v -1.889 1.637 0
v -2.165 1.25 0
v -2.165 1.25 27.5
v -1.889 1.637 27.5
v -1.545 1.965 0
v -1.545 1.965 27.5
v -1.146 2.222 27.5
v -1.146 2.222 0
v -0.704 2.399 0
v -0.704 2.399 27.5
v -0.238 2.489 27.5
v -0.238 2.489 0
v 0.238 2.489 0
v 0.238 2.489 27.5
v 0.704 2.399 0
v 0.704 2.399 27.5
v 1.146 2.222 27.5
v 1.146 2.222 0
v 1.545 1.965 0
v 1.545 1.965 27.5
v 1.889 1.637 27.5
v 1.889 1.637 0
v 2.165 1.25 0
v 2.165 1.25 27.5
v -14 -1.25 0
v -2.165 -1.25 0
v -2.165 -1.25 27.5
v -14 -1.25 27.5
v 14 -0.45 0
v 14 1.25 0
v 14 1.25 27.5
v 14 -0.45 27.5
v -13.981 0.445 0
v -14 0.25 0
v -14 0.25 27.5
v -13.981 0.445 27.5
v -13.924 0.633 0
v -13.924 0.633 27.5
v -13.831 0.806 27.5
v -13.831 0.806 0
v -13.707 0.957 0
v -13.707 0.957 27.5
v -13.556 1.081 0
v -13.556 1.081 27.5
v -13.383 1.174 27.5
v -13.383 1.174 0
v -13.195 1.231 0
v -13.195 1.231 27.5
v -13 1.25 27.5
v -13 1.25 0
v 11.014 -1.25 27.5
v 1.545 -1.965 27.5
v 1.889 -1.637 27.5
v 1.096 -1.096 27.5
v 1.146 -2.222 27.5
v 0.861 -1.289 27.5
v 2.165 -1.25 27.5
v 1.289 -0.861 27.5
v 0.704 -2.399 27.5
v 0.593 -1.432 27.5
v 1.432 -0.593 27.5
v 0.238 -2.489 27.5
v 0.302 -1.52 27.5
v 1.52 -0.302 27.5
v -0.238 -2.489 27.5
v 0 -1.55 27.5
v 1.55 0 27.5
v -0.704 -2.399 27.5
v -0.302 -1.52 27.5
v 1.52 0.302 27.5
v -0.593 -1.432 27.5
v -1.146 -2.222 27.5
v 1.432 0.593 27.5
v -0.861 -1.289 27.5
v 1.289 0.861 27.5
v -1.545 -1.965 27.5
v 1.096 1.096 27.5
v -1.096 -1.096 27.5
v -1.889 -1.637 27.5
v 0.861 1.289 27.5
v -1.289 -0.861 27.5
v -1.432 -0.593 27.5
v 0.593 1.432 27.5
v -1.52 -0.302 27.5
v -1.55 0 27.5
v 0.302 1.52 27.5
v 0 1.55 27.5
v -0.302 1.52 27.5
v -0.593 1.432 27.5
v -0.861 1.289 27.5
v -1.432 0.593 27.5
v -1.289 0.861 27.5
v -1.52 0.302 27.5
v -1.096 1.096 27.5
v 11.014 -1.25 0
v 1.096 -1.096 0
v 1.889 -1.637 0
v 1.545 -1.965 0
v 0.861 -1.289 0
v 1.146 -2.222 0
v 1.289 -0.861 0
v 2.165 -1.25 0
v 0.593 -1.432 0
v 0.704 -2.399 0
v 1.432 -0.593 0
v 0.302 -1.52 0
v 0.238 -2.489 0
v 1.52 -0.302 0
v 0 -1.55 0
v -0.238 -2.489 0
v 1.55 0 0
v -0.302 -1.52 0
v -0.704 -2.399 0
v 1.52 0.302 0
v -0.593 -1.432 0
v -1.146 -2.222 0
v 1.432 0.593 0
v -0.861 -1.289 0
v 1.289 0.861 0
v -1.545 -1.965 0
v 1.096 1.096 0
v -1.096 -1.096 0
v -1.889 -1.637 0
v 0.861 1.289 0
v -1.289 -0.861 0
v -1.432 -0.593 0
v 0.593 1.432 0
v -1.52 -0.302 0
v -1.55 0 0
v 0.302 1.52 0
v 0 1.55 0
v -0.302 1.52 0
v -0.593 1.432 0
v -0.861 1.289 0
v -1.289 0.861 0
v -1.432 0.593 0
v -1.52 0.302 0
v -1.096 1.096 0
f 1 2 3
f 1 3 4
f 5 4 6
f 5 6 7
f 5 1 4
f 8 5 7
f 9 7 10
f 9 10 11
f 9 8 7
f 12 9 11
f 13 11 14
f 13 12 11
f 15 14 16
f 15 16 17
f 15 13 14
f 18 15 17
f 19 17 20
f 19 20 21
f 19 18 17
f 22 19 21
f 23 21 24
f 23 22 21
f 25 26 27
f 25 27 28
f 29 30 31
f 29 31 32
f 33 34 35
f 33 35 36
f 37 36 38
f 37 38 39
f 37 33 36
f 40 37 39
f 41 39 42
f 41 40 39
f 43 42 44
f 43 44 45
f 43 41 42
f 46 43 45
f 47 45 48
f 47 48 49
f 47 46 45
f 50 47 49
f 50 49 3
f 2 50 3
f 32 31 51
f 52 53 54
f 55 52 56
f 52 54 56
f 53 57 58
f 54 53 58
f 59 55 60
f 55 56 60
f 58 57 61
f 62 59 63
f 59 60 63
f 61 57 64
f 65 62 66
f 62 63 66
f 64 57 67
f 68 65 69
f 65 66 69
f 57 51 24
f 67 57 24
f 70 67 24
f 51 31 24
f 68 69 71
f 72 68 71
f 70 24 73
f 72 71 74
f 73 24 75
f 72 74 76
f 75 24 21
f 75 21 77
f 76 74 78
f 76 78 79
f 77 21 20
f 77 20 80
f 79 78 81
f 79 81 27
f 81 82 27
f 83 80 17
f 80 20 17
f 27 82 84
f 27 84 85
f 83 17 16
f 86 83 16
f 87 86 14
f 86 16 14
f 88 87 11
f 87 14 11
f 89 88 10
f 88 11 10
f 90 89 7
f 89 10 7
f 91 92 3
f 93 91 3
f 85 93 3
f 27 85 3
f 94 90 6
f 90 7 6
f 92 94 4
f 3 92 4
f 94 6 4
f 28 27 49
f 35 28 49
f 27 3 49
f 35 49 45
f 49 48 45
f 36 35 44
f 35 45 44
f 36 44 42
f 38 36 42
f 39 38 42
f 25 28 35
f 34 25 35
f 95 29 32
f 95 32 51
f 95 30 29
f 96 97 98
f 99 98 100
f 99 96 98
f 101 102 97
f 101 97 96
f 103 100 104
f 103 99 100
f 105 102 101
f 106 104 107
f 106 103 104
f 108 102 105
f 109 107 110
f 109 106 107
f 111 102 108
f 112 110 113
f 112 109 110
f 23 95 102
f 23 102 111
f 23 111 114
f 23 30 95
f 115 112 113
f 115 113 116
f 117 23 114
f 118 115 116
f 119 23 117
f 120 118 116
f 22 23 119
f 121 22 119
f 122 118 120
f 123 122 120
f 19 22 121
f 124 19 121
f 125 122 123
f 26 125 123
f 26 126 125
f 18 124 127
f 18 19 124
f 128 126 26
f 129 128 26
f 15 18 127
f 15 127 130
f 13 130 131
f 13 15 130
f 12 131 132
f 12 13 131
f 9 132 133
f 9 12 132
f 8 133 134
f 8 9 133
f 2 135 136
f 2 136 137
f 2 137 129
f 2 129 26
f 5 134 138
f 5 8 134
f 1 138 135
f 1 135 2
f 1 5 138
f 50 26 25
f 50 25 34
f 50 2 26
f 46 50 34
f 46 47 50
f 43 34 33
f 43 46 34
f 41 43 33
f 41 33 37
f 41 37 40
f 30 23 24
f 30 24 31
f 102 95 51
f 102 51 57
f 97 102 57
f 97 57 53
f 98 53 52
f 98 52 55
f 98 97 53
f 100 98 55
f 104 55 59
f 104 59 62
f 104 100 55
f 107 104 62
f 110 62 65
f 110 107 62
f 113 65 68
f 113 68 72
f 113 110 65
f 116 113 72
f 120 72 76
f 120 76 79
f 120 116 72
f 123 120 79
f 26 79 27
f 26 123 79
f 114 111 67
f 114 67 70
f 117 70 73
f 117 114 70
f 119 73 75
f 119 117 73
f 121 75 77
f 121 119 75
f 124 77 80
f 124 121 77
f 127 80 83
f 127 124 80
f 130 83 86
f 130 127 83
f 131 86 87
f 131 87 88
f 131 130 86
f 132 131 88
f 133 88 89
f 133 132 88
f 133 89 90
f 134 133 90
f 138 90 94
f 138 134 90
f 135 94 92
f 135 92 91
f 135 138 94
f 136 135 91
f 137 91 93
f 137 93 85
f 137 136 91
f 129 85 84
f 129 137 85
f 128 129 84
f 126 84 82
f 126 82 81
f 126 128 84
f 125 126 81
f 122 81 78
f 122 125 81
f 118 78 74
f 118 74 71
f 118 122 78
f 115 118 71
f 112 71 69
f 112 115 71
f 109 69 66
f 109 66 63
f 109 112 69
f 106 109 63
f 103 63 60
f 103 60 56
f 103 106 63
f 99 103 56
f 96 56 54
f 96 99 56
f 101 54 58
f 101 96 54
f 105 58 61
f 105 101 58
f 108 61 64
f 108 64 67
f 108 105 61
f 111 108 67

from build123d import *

# Parameters (mm, degrees)
SKETCH_1_R      = 1.55
EXTRUDE_1_DEPTH = 27.5


with BuildPart() as part:
    # 草图1 → 凸台-拉伸1 (new body)
    with BuildSketch(Plane.XY):
        with BuildLine():
            Line((2.165063509, 1.25), (14, 1.25))
            Line((14, 1.25), (14, -0.45))
            Line((14, -0.45), (11.014359354, -1.25))
            Line((11.014359354, -1.25), (2.165063509, -1.25))
            ThreePointArc((2.165063509, -1.25), (0, -2.5), (-2.165063509, -1.25))
            Line((-2.165063509, -1.25), (-14, -1.25))
            Line((-14, -1.25), (-14, 0.25))
            ThreePointArc((-14, 0.25), (-13.707106781, 0.957106781), (-13, 1.25))
            Line((-13, 1.25), (-2.165063509, 1.25))
            ThreePointArc((-2.165063509, 1.25), (0, 2.5), (2.165063509, 1.25))
        make_face()
        Circle(SKETCH_1_R, mode=Mode.SUBTRACT)
    extrude(amount=EXTRUDE_1_DEPTH)


solid = part.part
